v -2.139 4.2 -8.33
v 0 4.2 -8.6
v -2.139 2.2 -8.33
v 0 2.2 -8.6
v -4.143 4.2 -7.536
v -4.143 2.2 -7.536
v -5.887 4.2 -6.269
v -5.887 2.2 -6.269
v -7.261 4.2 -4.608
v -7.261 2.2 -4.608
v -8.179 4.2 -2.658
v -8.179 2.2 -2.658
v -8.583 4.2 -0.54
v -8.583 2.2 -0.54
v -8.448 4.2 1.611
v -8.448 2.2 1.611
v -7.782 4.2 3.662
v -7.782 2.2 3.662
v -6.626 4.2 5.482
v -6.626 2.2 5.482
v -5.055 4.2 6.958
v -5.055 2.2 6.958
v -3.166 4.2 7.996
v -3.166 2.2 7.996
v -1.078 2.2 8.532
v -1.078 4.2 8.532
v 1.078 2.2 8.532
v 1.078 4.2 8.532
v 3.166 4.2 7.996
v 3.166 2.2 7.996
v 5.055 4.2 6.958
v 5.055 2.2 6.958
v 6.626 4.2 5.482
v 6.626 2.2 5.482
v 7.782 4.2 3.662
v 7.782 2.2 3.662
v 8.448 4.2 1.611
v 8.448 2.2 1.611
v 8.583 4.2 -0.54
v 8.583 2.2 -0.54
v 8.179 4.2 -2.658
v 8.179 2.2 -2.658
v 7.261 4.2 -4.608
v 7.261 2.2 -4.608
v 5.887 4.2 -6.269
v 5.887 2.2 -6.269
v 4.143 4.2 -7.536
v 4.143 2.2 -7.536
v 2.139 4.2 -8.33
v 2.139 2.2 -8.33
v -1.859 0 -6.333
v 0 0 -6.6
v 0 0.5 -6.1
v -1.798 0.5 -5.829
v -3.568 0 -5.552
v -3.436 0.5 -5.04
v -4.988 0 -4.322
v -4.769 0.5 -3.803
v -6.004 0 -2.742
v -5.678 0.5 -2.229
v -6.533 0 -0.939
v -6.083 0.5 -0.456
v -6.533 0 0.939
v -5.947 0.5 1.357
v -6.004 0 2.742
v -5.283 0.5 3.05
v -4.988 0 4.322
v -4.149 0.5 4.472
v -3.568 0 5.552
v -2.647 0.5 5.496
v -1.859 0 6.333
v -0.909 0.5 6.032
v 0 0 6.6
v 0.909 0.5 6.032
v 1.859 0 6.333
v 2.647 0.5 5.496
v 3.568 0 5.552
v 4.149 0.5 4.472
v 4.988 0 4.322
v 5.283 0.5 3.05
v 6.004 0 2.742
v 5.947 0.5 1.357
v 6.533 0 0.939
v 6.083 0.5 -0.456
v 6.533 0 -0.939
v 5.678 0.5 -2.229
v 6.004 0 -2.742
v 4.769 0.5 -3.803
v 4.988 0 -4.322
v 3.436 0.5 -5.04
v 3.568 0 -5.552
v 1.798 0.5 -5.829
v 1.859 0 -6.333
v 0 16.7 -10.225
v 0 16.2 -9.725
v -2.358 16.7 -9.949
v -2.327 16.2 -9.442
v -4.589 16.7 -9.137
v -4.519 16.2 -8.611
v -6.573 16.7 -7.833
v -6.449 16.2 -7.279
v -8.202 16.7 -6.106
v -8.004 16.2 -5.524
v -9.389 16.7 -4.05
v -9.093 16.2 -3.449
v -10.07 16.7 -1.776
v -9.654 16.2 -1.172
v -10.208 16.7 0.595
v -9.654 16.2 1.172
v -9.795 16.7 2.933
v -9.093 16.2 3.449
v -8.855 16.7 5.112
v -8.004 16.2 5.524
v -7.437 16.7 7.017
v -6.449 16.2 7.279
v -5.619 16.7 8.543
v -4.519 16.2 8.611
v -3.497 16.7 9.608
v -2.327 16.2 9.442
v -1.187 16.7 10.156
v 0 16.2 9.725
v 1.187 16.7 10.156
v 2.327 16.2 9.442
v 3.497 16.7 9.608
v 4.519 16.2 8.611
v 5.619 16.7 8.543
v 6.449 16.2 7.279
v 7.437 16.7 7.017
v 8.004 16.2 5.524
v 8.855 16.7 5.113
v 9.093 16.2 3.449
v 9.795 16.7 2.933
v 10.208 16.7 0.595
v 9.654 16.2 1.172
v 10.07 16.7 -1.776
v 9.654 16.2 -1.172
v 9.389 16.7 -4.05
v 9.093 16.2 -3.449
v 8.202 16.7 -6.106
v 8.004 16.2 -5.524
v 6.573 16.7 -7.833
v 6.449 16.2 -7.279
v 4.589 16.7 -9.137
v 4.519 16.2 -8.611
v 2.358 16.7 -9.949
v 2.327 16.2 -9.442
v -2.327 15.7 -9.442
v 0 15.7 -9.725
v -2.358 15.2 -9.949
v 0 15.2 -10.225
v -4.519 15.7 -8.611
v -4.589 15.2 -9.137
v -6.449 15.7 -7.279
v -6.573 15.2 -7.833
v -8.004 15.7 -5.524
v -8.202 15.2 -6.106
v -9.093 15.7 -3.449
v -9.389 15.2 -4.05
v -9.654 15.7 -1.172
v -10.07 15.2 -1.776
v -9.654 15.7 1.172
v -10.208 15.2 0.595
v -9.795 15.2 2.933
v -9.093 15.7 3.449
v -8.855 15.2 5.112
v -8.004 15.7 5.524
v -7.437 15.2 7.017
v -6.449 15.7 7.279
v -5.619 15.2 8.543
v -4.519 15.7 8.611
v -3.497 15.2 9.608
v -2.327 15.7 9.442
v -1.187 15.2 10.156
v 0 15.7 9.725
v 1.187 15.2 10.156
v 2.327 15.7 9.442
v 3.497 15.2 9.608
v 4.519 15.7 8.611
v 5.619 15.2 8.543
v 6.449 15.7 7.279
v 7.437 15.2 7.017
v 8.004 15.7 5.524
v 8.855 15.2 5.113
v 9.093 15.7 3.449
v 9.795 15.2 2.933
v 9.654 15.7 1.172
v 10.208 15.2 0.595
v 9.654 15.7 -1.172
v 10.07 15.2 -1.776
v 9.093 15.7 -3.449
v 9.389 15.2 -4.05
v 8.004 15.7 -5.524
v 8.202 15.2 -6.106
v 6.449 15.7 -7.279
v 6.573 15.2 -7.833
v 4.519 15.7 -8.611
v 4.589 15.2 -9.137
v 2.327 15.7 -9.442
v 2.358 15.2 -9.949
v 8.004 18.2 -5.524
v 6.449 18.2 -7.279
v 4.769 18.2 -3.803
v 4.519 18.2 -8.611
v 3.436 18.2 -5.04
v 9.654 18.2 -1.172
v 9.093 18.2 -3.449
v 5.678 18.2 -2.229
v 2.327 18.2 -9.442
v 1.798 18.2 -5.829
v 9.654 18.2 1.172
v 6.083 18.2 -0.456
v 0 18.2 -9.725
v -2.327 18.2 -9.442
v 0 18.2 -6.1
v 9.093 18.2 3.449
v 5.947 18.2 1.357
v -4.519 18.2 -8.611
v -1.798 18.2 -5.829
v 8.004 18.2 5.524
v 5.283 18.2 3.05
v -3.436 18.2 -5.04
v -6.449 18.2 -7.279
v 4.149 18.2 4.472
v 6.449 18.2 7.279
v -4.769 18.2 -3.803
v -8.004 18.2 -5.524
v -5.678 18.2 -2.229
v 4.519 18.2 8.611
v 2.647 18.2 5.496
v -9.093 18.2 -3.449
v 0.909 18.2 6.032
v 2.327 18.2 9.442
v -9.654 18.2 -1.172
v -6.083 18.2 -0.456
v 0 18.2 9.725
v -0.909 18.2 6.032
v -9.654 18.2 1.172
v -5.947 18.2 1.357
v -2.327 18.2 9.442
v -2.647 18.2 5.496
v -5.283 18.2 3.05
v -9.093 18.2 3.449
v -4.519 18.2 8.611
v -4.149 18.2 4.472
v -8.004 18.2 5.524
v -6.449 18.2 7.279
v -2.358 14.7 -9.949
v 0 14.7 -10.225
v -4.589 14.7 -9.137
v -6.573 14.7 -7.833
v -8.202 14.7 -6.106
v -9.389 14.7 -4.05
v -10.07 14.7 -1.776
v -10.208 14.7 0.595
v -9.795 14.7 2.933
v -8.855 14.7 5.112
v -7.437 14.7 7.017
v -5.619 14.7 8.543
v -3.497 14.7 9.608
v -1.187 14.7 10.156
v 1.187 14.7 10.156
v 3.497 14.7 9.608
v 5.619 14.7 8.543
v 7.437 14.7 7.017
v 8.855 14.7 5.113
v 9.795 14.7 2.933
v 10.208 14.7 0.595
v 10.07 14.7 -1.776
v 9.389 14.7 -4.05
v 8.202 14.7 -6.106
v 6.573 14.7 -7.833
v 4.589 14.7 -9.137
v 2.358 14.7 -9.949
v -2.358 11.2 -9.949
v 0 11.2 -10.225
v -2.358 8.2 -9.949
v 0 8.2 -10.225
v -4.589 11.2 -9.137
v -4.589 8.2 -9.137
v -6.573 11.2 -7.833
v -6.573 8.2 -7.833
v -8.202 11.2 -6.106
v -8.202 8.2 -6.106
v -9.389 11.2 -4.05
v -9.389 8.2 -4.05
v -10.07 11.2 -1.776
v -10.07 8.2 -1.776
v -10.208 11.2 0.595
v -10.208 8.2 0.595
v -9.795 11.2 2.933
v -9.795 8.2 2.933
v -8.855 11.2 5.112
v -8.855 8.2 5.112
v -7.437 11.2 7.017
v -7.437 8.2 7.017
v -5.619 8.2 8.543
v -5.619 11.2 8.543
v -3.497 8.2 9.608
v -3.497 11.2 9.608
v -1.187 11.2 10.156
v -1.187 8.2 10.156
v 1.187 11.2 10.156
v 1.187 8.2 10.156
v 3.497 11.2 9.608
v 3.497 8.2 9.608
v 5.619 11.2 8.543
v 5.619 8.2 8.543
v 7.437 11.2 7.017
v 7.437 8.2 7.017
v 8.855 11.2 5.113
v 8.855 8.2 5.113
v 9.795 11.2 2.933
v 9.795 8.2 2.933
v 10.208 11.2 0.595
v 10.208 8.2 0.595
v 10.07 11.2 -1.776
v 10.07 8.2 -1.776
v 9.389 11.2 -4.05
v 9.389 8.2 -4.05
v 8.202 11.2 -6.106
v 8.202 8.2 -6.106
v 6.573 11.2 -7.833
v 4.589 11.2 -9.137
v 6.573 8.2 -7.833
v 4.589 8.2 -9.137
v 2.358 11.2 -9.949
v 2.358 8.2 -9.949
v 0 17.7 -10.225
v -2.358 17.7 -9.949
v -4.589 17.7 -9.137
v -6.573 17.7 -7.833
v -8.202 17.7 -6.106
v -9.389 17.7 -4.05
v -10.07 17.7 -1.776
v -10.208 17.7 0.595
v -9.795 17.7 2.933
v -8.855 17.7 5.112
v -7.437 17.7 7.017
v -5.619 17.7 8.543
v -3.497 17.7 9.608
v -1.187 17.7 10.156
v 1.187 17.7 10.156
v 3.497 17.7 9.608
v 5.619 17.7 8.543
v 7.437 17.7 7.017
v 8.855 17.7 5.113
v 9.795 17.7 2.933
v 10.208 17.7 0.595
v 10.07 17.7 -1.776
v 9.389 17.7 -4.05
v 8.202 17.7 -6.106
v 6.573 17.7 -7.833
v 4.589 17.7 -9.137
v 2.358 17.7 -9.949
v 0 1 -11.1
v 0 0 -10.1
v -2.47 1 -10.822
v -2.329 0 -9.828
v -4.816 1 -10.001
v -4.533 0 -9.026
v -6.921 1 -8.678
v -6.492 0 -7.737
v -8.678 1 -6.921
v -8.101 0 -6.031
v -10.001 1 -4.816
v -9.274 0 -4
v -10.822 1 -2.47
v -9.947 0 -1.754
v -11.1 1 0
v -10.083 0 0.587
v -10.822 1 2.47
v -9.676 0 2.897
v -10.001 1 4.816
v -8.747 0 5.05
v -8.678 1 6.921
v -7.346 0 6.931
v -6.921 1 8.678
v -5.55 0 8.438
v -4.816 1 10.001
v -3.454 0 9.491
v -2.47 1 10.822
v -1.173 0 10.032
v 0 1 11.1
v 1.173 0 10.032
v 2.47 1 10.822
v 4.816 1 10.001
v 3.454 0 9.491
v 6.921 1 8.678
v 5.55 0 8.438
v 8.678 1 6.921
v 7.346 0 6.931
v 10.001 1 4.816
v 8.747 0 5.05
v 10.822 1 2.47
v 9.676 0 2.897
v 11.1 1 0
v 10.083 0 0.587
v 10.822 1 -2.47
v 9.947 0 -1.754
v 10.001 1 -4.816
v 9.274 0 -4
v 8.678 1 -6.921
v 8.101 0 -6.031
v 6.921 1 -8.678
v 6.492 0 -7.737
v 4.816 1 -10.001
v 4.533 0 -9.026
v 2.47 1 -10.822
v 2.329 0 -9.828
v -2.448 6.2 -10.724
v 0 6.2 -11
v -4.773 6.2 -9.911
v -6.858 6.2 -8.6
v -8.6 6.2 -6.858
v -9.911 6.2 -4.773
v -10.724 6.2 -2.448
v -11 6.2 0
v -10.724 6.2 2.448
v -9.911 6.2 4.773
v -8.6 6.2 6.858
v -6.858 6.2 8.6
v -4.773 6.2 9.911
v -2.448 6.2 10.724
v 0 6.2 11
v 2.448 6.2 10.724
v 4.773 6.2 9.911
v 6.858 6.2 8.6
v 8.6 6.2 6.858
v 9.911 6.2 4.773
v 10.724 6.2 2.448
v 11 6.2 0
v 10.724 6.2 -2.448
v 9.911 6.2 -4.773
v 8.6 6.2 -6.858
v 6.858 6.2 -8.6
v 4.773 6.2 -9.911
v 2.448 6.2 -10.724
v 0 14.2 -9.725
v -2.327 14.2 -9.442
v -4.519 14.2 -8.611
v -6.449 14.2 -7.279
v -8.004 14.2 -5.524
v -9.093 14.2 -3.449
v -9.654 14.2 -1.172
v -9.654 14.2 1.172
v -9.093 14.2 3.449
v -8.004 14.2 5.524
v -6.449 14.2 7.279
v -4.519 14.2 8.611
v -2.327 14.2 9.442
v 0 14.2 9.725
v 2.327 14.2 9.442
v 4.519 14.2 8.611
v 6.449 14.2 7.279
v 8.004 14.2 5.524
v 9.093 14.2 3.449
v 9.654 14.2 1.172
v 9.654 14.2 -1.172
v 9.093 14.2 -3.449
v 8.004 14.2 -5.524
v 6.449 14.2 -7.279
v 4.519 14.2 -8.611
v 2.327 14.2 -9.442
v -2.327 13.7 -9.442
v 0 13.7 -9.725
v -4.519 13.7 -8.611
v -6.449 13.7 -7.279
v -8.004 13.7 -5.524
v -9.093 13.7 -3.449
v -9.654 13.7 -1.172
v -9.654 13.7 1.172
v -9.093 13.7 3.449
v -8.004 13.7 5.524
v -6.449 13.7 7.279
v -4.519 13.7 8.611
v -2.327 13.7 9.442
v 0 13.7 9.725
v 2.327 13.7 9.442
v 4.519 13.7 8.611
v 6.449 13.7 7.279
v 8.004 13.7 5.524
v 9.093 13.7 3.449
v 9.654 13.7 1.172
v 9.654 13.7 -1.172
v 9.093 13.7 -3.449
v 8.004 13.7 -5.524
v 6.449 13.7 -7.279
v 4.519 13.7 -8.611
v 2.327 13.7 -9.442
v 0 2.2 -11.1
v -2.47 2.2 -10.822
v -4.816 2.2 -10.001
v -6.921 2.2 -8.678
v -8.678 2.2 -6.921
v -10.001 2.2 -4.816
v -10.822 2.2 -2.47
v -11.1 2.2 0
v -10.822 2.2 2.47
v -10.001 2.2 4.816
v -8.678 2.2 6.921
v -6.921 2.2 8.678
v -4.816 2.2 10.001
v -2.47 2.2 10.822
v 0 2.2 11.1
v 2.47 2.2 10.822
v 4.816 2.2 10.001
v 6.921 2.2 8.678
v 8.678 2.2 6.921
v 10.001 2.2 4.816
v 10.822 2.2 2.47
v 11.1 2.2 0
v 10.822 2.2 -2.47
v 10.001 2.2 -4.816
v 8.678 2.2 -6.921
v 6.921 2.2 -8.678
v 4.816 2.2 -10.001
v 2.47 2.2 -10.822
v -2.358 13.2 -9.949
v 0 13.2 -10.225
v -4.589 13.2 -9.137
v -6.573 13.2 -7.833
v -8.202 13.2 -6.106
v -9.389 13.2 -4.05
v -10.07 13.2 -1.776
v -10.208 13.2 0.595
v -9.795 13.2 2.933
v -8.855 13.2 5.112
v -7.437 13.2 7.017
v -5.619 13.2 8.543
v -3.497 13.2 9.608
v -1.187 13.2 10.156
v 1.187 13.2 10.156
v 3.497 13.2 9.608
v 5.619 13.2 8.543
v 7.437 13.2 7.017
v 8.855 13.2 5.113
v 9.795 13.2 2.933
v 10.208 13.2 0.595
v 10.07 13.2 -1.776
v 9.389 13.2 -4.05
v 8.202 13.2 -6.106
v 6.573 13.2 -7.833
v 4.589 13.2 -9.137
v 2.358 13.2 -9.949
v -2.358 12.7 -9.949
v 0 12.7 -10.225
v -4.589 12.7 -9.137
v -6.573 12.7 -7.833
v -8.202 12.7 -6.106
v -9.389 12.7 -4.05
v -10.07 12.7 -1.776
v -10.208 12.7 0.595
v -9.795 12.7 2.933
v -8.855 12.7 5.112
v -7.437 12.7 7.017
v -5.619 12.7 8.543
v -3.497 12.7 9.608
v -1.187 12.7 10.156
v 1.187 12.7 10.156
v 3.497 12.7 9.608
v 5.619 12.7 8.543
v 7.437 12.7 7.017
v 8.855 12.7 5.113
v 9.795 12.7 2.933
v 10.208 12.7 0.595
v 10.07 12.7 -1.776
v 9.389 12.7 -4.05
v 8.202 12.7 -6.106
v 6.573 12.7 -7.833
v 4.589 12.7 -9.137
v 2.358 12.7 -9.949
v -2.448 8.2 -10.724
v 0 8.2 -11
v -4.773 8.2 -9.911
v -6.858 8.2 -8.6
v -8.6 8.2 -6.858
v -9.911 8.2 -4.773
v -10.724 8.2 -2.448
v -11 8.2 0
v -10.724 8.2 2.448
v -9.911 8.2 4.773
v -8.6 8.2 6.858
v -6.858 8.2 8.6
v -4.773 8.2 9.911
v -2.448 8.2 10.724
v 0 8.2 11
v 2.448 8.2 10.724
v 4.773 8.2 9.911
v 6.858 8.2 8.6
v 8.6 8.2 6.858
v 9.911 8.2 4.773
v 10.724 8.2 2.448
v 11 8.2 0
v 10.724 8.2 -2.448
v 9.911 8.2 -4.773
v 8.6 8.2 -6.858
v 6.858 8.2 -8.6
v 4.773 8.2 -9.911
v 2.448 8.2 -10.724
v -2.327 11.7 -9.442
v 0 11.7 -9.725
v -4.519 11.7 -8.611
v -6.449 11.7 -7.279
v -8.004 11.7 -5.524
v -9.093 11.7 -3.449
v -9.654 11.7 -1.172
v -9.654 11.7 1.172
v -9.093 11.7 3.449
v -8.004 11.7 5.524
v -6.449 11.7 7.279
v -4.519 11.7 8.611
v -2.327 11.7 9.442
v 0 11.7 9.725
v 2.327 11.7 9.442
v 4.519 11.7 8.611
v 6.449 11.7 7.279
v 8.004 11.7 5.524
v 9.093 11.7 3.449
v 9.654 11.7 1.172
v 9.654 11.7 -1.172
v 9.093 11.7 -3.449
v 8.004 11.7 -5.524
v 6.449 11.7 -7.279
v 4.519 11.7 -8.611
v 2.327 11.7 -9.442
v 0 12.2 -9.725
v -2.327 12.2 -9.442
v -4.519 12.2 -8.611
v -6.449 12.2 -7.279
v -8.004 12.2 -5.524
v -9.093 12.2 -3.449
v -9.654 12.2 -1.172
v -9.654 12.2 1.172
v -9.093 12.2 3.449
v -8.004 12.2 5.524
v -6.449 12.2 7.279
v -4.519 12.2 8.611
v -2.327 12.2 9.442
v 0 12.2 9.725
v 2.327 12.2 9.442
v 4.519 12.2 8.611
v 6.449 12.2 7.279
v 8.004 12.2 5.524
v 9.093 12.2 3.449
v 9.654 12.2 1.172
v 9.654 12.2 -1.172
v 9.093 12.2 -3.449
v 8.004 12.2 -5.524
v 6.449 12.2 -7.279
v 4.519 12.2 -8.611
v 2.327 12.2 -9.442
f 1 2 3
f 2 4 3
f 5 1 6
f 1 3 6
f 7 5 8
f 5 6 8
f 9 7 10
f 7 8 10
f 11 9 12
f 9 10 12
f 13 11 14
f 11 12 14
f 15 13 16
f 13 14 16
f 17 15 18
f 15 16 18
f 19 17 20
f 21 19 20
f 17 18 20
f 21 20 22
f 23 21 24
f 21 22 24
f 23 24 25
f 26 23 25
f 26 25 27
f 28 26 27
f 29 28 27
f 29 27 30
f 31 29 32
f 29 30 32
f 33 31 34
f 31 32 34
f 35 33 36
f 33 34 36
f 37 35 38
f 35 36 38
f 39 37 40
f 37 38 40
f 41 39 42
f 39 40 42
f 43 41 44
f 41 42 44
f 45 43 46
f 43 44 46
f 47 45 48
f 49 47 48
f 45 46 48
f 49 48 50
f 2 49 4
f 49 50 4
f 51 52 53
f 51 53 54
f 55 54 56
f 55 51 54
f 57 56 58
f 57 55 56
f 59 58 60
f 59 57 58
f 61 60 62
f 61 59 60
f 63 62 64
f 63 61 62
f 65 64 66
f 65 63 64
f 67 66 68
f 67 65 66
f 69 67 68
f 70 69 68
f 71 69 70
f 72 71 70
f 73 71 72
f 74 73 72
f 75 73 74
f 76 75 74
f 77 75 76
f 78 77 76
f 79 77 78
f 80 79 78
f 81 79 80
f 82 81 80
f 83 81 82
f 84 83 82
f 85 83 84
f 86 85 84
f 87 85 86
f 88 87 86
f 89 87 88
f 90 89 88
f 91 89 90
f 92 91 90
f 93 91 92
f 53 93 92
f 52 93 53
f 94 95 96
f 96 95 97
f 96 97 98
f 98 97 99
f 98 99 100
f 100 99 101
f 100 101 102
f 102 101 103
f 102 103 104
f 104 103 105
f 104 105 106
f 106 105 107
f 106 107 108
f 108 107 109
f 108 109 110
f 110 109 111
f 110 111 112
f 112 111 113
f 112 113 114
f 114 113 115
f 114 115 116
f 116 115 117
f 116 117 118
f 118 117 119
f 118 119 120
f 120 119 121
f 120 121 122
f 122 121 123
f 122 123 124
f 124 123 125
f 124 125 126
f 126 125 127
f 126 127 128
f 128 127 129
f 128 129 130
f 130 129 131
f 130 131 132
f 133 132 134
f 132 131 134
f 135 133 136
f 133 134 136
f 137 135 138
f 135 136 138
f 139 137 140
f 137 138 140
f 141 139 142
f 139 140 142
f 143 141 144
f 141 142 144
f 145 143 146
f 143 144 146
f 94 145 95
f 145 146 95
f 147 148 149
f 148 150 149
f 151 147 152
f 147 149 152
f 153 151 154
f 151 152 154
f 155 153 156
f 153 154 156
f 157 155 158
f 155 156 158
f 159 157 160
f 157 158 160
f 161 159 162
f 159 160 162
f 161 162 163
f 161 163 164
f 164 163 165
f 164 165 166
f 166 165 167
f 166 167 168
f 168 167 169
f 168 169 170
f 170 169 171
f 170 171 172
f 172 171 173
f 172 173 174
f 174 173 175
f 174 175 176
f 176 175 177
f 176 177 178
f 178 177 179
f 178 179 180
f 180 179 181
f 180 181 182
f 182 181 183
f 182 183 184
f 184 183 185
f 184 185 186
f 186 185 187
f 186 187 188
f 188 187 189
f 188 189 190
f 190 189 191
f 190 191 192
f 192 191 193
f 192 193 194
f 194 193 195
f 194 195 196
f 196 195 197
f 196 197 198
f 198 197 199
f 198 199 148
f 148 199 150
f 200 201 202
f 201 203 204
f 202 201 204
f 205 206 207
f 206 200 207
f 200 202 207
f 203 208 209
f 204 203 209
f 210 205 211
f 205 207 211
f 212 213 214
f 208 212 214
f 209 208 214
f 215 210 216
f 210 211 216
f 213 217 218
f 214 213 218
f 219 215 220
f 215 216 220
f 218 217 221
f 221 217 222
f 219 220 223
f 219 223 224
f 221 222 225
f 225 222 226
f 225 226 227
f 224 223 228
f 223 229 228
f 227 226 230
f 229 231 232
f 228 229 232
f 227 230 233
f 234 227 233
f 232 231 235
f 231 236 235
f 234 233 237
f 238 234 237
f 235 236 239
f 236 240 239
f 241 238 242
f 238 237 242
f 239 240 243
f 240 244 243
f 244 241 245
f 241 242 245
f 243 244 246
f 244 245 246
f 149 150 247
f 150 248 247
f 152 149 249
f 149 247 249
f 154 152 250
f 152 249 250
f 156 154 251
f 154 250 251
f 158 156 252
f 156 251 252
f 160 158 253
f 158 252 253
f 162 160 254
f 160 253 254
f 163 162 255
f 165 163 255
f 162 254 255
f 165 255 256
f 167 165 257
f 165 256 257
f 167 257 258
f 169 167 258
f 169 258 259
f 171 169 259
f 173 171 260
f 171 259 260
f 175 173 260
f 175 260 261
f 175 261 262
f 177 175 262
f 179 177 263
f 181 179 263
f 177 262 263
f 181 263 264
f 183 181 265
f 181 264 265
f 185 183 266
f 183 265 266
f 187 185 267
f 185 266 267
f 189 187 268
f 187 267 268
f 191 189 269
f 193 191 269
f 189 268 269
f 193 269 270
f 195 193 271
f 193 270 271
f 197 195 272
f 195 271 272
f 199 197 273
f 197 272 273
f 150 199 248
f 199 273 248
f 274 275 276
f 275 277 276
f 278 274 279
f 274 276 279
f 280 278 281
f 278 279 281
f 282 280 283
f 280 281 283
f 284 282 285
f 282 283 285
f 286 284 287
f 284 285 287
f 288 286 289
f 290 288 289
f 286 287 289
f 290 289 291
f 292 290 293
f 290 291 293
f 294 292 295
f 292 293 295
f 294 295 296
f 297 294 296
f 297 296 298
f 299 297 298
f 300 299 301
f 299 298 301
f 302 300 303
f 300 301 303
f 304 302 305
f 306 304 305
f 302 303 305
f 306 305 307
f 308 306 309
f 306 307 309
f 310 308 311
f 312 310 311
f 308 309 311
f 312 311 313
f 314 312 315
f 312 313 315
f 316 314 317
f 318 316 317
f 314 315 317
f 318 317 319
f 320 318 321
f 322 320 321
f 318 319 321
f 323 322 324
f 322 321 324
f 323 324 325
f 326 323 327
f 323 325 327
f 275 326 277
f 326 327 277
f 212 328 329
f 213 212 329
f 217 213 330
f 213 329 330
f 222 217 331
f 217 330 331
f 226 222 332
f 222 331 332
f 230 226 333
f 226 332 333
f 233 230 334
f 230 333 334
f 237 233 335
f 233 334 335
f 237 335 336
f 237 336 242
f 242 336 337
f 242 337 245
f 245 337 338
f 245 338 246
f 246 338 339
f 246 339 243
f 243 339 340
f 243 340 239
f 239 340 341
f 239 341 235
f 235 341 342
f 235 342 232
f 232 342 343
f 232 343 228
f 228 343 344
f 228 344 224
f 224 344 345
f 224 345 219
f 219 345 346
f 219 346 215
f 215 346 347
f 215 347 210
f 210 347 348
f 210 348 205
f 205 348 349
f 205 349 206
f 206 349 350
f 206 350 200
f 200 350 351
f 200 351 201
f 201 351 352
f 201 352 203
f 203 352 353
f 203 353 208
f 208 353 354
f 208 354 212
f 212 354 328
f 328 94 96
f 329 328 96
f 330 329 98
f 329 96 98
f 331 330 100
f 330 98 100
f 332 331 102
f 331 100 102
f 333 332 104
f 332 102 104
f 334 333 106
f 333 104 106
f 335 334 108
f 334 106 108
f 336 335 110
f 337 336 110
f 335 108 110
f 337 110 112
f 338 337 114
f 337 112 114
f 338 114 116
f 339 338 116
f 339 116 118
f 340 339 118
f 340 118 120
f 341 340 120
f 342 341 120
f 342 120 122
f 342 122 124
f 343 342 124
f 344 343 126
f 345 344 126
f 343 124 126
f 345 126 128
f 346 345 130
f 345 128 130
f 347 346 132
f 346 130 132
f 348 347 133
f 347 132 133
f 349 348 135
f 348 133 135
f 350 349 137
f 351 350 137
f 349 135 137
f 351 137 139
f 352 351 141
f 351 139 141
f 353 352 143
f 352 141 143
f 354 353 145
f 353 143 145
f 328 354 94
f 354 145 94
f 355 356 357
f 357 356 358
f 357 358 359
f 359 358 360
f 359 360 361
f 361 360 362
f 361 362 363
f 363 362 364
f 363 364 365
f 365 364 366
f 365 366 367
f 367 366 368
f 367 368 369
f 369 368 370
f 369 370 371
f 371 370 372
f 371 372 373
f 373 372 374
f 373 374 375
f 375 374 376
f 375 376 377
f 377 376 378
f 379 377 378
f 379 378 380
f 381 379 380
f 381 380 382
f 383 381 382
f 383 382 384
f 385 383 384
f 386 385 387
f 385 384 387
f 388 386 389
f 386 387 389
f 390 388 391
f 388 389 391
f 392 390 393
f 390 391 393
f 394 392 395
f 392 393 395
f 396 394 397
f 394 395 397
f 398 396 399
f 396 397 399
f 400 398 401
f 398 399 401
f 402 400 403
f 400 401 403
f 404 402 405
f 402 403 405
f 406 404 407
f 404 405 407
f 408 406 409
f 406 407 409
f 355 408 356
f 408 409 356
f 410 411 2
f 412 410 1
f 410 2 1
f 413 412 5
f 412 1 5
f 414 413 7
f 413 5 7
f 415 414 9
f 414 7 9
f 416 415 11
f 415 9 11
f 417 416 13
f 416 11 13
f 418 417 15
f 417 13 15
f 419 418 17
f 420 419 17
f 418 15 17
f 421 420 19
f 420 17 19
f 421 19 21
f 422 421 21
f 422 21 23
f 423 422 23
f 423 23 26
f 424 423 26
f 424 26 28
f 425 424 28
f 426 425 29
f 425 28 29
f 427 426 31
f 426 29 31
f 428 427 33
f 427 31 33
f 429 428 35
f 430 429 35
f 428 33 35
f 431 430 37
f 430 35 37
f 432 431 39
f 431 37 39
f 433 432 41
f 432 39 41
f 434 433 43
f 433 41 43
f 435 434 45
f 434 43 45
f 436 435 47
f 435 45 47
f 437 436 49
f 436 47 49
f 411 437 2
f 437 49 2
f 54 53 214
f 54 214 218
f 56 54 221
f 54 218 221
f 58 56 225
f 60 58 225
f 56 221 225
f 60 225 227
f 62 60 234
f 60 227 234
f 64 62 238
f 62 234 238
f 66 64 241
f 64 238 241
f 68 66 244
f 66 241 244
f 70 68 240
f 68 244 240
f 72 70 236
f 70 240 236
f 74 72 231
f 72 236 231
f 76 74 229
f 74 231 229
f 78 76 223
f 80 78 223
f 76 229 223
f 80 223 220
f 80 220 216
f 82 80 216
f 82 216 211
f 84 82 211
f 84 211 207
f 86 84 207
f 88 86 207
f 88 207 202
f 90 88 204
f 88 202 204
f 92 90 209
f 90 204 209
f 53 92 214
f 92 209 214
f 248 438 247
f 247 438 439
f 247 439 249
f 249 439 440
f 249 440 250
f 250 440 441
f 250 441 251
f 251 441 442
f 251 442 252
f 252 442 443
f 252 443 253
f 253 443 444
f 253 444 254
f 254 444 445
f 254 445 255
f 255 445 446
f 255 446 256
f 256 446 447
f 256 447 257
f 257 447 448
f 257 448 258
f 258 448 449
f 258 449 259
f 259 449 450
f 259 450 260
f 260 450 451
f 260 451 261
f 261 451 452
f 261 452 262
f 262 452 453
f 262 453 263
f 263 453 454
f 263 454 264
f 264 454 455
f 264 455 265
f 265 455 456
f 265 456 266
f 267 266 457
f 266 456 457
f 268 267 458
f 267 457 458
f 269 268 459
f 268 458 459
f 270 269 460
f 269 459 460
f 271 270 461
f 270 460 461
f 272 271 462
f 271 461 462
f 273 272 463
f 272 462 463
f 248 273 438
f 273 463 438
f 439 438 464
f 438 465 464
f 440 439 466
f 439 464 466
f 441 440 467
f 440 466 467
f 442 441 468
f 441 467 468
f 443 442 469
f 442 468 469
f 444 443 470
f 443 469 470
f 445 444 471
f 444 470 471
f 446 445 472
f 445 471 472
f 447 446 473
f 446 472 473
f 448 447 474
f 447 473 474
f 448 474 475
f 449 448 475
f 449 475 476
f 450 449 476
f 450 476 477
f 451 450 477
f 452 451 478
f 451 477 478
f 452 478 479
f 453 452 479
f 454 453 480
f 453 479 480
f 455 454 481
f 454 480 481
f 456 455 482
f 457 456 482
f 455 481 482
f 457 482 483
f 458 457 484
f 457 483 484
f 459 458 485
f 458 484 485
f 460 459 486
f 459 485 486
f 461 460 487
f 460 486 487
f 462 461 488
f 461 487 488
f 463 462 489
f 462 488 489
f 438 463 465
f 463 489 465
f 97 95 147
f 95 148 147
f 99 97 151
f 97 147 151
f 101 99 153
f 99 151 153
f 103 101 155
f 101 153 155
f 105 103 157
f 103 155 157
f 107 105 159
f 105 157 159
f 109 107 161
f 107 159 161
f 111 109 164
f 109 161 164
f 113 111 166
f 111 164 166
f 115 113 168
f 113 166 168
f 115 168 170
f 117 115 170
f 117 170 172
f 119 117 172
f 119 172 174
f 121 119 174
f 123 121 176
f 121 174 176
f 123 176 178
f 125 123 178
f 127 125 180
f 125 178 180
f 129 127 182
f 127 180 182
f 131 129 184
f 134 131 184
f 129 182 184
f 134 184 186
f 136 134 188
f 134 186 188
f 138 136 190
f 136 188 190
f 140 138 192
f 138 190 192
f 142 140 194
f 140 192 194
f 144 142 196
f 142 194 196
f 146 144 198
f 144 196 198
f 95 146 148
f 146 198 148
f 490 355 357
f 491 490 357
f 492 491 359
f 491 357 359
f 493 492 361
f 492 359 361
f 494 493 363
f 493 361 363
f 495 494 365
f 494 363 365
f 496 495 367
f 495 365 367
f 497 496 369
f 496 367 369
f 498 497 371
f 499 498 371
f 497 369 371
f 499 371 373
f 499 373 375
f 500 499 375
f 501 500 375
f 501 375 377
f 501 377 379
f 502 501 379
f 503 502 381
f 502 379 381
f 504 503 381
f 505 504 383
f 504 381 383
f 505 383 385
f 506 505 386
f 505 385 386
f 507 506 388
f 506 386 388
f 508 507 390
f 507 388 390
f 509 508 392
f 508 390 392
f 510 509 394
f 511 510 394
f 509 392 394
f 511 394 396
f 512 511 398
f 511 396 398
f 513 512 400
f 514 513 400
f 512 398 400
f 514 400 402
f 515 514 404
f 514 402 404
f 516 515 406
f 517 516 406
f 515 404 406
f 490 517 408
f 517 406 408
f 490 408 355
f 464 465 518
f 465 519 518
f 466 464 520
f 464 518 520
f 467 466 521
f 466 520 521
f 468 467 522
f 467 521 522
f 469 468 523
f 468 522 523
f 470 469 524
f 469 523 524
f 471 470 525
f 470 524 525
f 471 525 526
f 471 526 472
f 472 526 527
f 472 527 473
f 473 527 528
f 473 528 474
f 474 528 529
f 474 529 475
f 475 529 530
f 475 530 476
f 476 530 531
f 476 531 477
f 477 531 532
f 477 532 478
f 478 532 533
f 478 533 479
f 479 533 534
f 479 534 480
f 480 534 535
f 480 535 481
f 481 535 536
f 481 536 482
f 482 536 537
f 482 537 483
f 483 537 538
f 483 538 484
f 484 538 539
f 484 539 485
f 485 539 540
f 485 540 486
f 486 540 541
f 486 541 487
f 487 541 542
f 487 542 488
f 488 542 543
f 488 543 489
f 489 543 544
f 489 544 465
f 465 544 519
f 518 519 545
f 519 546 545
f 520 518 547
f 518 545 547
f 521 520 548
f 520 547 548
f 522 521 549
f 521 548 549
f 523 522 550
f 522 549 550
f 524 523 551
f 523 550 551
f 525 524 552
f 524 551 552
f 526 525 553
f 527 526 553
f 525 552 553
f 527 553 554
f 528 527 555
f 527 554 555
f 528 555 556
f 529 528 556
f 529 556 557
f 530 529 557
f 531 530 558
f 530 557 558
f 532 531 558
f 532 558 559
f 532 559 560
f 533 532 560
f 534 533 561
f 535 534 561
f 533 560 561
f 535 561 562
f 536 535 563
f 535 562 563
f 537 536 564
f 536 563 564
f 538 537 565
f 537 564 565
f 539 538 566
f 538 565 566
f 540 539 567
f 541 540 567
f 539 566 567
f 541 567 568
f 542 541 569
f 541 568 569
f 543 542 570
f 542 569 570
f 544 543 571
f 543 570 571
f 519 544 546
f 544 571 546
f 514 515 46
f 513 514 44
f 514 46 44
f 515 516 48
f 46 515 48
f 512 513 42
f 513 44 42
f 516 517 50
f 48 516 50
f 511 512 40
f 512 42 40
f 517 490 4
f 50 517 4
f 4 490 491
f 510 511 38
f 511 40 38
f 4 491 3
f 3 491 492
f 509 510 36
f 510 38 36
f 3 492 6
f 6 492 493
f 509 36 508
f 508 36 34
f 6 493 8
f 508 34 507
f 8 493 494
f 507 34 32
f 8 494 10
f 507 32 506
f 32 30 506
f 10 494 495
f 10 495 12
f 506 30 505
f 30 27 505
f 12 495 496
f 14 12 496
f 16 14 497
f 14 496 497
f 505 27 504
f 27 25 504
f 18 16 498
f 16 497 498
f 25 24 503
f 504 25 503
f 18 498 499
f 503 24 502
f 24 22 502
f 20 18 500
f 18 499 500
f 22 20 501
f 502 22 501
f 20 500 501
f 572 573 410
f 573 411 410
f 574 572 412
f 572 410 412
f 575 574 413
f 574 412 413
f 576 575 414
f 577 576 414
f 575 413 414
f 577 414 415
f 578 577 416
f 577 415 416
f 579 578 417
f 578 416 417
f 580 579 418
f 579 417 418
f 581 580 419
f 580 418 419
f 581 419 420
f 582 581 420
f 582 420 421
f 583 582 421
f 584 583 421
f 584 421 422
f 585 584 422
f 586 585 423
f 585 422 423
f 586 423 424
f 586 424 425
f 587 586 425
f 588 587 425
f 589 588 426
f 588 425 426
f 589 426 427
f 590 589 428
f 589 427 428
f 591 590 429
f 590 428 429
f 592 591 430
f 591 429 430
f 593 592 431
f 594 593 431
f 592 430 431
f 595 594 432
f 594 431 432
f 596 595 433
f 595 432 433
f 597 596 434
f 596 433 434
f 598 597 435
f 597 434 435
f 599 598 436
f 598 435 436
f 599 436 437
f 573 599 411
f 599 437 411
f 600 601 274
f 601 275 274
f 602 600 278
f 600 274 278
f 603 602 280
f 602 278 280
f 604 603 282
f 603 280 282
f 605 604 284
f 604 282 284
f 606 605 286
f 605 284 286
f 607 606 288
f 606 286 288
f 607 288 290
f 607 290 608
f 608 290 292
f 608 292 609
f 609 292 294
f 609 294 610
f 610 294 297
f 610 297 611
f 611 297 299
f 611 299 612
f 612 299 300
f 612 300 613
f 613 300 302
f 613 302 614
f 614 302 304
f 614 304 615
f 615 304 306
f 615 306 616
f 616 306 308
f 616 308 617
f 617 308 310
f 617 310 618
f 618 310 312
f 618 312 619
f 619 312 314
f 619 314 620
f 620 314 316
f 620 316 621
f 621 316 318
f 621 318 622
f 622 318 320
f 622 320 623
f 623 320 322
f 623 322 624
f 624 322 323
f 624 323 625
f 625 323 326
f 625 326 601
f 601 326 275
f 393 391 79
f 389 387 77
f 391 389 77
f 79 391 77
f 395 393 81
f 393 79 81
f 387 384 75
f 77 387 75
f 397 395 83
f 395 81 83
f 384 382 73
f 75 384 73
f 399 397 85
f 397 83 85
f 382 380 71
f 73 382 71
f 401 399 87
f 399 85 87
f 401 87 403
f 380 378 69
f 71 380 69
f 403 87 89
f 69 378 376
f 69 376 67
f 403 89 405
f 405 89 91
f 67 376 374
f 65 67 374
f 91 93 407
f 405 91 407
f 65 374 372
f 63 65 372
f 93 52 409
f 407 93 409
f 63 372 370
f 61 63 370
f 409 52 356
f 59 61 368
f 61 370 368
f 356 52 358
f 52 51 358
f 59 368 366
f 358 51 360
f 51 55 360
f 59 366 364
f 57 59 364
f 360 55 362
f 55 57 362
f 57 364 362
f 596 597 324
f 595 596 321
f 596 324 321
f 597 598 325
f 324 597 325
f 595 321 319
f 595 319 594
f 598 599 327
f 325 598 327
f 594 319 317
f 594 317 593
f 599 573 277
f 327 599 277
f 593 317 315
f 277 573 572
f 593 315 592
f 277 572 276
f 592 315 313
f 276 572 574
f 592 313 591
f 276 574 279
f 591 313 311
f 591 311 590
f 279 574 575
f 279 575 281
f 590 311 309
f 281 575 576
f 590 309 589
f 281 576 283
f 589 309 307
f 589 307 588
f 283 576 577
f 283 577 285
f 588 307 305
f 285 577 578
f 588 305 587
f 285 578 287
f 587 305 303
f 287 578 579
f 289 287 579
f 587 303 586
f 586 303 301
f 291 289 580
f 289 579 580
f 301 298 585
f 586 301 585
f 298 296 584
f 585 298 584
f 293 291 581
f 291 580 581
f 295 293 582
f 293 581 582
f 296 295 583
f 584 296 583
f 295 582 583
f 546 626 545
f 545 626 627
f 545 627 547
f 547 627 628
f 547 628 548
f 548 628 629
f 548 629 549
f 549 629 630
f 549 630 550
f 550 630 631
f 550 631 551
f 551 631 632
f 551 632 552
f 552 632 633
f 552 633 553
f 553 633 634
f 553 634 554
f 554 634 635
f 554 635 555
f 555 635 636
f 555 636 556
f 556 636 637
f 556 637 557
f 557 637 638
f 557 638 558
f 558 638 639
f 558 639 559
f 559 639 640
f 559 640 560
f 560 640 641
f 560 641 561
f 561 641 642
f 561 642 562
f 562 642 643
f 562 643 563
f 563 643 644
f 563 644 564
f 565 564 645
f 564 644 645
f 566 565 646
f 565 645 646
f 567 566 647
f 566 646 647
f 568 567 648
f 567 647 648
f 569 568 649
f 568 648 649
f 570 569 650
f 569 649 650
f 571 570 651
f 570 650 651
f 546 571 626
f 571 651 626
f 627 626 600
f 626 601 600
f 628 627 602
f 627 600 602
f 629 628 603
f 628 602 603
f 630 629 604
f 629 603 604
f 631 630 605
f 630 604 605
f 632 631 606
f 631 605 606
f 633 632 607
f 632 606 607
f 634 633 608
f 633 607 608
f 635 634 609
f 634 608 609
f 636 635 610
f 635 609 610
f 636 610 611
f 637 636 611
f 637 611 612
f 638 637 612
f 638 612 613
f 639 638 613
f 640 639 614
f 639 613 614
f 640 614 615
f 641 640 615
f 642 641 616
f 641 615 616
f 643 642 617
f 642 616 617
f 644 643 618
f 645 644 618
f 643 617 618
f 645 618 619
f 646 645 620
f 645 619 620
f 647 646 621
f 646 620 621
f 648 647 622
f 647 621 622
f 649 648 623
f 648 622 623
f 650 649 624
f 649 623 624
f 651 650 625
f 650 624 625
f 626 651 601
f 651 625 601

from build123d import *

# Parameters (mm, degrees)
CHAMFER_1_SIZE = 1
CHAMFER_2_SIZE = 0.5
CHAMFER_3_SIZE = 0.5


with BuildPart() as part:
    # 스케치1 → 회전1 (revolve)
    with BuildSketch(Plane(origin=(0, 0, 0), x_dir=(0, 0, -1), z_dir=(1, 0, 0))):
        Polygon((6.1, 0), (6.1, 18.2), (10.225, 18.2), (10.225, 16.7), (9.725, 16.200000049), (9.725, 15.700000049), (10.225, 15.2), (10.225, 14.7), (9.725, 14.200000049), (9.725, 13.700000049), (10.225, 13.2), (10.225, 12.7), (9.725, 12.200000049), (9.725, 11.700000049), (10.225, 11.2), (10.225, 8.2), (11, 8.2), (11, 6.2), (8.6, 4.2), (8.6, 2.2), (11.1, 2.2), (11.1, 0), align=None)
    revolve(axis=Axis((0, 0, 0), (0, 1, 0)))

    # 모따기1
    chamfer_1_edges = [part.edges().sort_by_distance(p)[0] for p in [
        (0, 0, 11.1),
    ]]
    chamfer(chamfer_1_edges, length=CHAMFER_1_SIZE)

    # 모따기2
    chamfer_2_edges = [part.edges().sort_by_distance(p)[0] for p in [
        (0, 18.2, 10.225),
    ]]
    chamfer(chamfer_2_edges, length=CHAMFER_2_SIZE)

    # 모따기3
    chamfer_3_edges = [part.edges().sort_by_distance(p)[0] for p in [
        (0, 0, 6.1),
    ]]
    chamfer(chamfer_3_edges, length=CHAMFER_3_SIZE)


solid = part.part
